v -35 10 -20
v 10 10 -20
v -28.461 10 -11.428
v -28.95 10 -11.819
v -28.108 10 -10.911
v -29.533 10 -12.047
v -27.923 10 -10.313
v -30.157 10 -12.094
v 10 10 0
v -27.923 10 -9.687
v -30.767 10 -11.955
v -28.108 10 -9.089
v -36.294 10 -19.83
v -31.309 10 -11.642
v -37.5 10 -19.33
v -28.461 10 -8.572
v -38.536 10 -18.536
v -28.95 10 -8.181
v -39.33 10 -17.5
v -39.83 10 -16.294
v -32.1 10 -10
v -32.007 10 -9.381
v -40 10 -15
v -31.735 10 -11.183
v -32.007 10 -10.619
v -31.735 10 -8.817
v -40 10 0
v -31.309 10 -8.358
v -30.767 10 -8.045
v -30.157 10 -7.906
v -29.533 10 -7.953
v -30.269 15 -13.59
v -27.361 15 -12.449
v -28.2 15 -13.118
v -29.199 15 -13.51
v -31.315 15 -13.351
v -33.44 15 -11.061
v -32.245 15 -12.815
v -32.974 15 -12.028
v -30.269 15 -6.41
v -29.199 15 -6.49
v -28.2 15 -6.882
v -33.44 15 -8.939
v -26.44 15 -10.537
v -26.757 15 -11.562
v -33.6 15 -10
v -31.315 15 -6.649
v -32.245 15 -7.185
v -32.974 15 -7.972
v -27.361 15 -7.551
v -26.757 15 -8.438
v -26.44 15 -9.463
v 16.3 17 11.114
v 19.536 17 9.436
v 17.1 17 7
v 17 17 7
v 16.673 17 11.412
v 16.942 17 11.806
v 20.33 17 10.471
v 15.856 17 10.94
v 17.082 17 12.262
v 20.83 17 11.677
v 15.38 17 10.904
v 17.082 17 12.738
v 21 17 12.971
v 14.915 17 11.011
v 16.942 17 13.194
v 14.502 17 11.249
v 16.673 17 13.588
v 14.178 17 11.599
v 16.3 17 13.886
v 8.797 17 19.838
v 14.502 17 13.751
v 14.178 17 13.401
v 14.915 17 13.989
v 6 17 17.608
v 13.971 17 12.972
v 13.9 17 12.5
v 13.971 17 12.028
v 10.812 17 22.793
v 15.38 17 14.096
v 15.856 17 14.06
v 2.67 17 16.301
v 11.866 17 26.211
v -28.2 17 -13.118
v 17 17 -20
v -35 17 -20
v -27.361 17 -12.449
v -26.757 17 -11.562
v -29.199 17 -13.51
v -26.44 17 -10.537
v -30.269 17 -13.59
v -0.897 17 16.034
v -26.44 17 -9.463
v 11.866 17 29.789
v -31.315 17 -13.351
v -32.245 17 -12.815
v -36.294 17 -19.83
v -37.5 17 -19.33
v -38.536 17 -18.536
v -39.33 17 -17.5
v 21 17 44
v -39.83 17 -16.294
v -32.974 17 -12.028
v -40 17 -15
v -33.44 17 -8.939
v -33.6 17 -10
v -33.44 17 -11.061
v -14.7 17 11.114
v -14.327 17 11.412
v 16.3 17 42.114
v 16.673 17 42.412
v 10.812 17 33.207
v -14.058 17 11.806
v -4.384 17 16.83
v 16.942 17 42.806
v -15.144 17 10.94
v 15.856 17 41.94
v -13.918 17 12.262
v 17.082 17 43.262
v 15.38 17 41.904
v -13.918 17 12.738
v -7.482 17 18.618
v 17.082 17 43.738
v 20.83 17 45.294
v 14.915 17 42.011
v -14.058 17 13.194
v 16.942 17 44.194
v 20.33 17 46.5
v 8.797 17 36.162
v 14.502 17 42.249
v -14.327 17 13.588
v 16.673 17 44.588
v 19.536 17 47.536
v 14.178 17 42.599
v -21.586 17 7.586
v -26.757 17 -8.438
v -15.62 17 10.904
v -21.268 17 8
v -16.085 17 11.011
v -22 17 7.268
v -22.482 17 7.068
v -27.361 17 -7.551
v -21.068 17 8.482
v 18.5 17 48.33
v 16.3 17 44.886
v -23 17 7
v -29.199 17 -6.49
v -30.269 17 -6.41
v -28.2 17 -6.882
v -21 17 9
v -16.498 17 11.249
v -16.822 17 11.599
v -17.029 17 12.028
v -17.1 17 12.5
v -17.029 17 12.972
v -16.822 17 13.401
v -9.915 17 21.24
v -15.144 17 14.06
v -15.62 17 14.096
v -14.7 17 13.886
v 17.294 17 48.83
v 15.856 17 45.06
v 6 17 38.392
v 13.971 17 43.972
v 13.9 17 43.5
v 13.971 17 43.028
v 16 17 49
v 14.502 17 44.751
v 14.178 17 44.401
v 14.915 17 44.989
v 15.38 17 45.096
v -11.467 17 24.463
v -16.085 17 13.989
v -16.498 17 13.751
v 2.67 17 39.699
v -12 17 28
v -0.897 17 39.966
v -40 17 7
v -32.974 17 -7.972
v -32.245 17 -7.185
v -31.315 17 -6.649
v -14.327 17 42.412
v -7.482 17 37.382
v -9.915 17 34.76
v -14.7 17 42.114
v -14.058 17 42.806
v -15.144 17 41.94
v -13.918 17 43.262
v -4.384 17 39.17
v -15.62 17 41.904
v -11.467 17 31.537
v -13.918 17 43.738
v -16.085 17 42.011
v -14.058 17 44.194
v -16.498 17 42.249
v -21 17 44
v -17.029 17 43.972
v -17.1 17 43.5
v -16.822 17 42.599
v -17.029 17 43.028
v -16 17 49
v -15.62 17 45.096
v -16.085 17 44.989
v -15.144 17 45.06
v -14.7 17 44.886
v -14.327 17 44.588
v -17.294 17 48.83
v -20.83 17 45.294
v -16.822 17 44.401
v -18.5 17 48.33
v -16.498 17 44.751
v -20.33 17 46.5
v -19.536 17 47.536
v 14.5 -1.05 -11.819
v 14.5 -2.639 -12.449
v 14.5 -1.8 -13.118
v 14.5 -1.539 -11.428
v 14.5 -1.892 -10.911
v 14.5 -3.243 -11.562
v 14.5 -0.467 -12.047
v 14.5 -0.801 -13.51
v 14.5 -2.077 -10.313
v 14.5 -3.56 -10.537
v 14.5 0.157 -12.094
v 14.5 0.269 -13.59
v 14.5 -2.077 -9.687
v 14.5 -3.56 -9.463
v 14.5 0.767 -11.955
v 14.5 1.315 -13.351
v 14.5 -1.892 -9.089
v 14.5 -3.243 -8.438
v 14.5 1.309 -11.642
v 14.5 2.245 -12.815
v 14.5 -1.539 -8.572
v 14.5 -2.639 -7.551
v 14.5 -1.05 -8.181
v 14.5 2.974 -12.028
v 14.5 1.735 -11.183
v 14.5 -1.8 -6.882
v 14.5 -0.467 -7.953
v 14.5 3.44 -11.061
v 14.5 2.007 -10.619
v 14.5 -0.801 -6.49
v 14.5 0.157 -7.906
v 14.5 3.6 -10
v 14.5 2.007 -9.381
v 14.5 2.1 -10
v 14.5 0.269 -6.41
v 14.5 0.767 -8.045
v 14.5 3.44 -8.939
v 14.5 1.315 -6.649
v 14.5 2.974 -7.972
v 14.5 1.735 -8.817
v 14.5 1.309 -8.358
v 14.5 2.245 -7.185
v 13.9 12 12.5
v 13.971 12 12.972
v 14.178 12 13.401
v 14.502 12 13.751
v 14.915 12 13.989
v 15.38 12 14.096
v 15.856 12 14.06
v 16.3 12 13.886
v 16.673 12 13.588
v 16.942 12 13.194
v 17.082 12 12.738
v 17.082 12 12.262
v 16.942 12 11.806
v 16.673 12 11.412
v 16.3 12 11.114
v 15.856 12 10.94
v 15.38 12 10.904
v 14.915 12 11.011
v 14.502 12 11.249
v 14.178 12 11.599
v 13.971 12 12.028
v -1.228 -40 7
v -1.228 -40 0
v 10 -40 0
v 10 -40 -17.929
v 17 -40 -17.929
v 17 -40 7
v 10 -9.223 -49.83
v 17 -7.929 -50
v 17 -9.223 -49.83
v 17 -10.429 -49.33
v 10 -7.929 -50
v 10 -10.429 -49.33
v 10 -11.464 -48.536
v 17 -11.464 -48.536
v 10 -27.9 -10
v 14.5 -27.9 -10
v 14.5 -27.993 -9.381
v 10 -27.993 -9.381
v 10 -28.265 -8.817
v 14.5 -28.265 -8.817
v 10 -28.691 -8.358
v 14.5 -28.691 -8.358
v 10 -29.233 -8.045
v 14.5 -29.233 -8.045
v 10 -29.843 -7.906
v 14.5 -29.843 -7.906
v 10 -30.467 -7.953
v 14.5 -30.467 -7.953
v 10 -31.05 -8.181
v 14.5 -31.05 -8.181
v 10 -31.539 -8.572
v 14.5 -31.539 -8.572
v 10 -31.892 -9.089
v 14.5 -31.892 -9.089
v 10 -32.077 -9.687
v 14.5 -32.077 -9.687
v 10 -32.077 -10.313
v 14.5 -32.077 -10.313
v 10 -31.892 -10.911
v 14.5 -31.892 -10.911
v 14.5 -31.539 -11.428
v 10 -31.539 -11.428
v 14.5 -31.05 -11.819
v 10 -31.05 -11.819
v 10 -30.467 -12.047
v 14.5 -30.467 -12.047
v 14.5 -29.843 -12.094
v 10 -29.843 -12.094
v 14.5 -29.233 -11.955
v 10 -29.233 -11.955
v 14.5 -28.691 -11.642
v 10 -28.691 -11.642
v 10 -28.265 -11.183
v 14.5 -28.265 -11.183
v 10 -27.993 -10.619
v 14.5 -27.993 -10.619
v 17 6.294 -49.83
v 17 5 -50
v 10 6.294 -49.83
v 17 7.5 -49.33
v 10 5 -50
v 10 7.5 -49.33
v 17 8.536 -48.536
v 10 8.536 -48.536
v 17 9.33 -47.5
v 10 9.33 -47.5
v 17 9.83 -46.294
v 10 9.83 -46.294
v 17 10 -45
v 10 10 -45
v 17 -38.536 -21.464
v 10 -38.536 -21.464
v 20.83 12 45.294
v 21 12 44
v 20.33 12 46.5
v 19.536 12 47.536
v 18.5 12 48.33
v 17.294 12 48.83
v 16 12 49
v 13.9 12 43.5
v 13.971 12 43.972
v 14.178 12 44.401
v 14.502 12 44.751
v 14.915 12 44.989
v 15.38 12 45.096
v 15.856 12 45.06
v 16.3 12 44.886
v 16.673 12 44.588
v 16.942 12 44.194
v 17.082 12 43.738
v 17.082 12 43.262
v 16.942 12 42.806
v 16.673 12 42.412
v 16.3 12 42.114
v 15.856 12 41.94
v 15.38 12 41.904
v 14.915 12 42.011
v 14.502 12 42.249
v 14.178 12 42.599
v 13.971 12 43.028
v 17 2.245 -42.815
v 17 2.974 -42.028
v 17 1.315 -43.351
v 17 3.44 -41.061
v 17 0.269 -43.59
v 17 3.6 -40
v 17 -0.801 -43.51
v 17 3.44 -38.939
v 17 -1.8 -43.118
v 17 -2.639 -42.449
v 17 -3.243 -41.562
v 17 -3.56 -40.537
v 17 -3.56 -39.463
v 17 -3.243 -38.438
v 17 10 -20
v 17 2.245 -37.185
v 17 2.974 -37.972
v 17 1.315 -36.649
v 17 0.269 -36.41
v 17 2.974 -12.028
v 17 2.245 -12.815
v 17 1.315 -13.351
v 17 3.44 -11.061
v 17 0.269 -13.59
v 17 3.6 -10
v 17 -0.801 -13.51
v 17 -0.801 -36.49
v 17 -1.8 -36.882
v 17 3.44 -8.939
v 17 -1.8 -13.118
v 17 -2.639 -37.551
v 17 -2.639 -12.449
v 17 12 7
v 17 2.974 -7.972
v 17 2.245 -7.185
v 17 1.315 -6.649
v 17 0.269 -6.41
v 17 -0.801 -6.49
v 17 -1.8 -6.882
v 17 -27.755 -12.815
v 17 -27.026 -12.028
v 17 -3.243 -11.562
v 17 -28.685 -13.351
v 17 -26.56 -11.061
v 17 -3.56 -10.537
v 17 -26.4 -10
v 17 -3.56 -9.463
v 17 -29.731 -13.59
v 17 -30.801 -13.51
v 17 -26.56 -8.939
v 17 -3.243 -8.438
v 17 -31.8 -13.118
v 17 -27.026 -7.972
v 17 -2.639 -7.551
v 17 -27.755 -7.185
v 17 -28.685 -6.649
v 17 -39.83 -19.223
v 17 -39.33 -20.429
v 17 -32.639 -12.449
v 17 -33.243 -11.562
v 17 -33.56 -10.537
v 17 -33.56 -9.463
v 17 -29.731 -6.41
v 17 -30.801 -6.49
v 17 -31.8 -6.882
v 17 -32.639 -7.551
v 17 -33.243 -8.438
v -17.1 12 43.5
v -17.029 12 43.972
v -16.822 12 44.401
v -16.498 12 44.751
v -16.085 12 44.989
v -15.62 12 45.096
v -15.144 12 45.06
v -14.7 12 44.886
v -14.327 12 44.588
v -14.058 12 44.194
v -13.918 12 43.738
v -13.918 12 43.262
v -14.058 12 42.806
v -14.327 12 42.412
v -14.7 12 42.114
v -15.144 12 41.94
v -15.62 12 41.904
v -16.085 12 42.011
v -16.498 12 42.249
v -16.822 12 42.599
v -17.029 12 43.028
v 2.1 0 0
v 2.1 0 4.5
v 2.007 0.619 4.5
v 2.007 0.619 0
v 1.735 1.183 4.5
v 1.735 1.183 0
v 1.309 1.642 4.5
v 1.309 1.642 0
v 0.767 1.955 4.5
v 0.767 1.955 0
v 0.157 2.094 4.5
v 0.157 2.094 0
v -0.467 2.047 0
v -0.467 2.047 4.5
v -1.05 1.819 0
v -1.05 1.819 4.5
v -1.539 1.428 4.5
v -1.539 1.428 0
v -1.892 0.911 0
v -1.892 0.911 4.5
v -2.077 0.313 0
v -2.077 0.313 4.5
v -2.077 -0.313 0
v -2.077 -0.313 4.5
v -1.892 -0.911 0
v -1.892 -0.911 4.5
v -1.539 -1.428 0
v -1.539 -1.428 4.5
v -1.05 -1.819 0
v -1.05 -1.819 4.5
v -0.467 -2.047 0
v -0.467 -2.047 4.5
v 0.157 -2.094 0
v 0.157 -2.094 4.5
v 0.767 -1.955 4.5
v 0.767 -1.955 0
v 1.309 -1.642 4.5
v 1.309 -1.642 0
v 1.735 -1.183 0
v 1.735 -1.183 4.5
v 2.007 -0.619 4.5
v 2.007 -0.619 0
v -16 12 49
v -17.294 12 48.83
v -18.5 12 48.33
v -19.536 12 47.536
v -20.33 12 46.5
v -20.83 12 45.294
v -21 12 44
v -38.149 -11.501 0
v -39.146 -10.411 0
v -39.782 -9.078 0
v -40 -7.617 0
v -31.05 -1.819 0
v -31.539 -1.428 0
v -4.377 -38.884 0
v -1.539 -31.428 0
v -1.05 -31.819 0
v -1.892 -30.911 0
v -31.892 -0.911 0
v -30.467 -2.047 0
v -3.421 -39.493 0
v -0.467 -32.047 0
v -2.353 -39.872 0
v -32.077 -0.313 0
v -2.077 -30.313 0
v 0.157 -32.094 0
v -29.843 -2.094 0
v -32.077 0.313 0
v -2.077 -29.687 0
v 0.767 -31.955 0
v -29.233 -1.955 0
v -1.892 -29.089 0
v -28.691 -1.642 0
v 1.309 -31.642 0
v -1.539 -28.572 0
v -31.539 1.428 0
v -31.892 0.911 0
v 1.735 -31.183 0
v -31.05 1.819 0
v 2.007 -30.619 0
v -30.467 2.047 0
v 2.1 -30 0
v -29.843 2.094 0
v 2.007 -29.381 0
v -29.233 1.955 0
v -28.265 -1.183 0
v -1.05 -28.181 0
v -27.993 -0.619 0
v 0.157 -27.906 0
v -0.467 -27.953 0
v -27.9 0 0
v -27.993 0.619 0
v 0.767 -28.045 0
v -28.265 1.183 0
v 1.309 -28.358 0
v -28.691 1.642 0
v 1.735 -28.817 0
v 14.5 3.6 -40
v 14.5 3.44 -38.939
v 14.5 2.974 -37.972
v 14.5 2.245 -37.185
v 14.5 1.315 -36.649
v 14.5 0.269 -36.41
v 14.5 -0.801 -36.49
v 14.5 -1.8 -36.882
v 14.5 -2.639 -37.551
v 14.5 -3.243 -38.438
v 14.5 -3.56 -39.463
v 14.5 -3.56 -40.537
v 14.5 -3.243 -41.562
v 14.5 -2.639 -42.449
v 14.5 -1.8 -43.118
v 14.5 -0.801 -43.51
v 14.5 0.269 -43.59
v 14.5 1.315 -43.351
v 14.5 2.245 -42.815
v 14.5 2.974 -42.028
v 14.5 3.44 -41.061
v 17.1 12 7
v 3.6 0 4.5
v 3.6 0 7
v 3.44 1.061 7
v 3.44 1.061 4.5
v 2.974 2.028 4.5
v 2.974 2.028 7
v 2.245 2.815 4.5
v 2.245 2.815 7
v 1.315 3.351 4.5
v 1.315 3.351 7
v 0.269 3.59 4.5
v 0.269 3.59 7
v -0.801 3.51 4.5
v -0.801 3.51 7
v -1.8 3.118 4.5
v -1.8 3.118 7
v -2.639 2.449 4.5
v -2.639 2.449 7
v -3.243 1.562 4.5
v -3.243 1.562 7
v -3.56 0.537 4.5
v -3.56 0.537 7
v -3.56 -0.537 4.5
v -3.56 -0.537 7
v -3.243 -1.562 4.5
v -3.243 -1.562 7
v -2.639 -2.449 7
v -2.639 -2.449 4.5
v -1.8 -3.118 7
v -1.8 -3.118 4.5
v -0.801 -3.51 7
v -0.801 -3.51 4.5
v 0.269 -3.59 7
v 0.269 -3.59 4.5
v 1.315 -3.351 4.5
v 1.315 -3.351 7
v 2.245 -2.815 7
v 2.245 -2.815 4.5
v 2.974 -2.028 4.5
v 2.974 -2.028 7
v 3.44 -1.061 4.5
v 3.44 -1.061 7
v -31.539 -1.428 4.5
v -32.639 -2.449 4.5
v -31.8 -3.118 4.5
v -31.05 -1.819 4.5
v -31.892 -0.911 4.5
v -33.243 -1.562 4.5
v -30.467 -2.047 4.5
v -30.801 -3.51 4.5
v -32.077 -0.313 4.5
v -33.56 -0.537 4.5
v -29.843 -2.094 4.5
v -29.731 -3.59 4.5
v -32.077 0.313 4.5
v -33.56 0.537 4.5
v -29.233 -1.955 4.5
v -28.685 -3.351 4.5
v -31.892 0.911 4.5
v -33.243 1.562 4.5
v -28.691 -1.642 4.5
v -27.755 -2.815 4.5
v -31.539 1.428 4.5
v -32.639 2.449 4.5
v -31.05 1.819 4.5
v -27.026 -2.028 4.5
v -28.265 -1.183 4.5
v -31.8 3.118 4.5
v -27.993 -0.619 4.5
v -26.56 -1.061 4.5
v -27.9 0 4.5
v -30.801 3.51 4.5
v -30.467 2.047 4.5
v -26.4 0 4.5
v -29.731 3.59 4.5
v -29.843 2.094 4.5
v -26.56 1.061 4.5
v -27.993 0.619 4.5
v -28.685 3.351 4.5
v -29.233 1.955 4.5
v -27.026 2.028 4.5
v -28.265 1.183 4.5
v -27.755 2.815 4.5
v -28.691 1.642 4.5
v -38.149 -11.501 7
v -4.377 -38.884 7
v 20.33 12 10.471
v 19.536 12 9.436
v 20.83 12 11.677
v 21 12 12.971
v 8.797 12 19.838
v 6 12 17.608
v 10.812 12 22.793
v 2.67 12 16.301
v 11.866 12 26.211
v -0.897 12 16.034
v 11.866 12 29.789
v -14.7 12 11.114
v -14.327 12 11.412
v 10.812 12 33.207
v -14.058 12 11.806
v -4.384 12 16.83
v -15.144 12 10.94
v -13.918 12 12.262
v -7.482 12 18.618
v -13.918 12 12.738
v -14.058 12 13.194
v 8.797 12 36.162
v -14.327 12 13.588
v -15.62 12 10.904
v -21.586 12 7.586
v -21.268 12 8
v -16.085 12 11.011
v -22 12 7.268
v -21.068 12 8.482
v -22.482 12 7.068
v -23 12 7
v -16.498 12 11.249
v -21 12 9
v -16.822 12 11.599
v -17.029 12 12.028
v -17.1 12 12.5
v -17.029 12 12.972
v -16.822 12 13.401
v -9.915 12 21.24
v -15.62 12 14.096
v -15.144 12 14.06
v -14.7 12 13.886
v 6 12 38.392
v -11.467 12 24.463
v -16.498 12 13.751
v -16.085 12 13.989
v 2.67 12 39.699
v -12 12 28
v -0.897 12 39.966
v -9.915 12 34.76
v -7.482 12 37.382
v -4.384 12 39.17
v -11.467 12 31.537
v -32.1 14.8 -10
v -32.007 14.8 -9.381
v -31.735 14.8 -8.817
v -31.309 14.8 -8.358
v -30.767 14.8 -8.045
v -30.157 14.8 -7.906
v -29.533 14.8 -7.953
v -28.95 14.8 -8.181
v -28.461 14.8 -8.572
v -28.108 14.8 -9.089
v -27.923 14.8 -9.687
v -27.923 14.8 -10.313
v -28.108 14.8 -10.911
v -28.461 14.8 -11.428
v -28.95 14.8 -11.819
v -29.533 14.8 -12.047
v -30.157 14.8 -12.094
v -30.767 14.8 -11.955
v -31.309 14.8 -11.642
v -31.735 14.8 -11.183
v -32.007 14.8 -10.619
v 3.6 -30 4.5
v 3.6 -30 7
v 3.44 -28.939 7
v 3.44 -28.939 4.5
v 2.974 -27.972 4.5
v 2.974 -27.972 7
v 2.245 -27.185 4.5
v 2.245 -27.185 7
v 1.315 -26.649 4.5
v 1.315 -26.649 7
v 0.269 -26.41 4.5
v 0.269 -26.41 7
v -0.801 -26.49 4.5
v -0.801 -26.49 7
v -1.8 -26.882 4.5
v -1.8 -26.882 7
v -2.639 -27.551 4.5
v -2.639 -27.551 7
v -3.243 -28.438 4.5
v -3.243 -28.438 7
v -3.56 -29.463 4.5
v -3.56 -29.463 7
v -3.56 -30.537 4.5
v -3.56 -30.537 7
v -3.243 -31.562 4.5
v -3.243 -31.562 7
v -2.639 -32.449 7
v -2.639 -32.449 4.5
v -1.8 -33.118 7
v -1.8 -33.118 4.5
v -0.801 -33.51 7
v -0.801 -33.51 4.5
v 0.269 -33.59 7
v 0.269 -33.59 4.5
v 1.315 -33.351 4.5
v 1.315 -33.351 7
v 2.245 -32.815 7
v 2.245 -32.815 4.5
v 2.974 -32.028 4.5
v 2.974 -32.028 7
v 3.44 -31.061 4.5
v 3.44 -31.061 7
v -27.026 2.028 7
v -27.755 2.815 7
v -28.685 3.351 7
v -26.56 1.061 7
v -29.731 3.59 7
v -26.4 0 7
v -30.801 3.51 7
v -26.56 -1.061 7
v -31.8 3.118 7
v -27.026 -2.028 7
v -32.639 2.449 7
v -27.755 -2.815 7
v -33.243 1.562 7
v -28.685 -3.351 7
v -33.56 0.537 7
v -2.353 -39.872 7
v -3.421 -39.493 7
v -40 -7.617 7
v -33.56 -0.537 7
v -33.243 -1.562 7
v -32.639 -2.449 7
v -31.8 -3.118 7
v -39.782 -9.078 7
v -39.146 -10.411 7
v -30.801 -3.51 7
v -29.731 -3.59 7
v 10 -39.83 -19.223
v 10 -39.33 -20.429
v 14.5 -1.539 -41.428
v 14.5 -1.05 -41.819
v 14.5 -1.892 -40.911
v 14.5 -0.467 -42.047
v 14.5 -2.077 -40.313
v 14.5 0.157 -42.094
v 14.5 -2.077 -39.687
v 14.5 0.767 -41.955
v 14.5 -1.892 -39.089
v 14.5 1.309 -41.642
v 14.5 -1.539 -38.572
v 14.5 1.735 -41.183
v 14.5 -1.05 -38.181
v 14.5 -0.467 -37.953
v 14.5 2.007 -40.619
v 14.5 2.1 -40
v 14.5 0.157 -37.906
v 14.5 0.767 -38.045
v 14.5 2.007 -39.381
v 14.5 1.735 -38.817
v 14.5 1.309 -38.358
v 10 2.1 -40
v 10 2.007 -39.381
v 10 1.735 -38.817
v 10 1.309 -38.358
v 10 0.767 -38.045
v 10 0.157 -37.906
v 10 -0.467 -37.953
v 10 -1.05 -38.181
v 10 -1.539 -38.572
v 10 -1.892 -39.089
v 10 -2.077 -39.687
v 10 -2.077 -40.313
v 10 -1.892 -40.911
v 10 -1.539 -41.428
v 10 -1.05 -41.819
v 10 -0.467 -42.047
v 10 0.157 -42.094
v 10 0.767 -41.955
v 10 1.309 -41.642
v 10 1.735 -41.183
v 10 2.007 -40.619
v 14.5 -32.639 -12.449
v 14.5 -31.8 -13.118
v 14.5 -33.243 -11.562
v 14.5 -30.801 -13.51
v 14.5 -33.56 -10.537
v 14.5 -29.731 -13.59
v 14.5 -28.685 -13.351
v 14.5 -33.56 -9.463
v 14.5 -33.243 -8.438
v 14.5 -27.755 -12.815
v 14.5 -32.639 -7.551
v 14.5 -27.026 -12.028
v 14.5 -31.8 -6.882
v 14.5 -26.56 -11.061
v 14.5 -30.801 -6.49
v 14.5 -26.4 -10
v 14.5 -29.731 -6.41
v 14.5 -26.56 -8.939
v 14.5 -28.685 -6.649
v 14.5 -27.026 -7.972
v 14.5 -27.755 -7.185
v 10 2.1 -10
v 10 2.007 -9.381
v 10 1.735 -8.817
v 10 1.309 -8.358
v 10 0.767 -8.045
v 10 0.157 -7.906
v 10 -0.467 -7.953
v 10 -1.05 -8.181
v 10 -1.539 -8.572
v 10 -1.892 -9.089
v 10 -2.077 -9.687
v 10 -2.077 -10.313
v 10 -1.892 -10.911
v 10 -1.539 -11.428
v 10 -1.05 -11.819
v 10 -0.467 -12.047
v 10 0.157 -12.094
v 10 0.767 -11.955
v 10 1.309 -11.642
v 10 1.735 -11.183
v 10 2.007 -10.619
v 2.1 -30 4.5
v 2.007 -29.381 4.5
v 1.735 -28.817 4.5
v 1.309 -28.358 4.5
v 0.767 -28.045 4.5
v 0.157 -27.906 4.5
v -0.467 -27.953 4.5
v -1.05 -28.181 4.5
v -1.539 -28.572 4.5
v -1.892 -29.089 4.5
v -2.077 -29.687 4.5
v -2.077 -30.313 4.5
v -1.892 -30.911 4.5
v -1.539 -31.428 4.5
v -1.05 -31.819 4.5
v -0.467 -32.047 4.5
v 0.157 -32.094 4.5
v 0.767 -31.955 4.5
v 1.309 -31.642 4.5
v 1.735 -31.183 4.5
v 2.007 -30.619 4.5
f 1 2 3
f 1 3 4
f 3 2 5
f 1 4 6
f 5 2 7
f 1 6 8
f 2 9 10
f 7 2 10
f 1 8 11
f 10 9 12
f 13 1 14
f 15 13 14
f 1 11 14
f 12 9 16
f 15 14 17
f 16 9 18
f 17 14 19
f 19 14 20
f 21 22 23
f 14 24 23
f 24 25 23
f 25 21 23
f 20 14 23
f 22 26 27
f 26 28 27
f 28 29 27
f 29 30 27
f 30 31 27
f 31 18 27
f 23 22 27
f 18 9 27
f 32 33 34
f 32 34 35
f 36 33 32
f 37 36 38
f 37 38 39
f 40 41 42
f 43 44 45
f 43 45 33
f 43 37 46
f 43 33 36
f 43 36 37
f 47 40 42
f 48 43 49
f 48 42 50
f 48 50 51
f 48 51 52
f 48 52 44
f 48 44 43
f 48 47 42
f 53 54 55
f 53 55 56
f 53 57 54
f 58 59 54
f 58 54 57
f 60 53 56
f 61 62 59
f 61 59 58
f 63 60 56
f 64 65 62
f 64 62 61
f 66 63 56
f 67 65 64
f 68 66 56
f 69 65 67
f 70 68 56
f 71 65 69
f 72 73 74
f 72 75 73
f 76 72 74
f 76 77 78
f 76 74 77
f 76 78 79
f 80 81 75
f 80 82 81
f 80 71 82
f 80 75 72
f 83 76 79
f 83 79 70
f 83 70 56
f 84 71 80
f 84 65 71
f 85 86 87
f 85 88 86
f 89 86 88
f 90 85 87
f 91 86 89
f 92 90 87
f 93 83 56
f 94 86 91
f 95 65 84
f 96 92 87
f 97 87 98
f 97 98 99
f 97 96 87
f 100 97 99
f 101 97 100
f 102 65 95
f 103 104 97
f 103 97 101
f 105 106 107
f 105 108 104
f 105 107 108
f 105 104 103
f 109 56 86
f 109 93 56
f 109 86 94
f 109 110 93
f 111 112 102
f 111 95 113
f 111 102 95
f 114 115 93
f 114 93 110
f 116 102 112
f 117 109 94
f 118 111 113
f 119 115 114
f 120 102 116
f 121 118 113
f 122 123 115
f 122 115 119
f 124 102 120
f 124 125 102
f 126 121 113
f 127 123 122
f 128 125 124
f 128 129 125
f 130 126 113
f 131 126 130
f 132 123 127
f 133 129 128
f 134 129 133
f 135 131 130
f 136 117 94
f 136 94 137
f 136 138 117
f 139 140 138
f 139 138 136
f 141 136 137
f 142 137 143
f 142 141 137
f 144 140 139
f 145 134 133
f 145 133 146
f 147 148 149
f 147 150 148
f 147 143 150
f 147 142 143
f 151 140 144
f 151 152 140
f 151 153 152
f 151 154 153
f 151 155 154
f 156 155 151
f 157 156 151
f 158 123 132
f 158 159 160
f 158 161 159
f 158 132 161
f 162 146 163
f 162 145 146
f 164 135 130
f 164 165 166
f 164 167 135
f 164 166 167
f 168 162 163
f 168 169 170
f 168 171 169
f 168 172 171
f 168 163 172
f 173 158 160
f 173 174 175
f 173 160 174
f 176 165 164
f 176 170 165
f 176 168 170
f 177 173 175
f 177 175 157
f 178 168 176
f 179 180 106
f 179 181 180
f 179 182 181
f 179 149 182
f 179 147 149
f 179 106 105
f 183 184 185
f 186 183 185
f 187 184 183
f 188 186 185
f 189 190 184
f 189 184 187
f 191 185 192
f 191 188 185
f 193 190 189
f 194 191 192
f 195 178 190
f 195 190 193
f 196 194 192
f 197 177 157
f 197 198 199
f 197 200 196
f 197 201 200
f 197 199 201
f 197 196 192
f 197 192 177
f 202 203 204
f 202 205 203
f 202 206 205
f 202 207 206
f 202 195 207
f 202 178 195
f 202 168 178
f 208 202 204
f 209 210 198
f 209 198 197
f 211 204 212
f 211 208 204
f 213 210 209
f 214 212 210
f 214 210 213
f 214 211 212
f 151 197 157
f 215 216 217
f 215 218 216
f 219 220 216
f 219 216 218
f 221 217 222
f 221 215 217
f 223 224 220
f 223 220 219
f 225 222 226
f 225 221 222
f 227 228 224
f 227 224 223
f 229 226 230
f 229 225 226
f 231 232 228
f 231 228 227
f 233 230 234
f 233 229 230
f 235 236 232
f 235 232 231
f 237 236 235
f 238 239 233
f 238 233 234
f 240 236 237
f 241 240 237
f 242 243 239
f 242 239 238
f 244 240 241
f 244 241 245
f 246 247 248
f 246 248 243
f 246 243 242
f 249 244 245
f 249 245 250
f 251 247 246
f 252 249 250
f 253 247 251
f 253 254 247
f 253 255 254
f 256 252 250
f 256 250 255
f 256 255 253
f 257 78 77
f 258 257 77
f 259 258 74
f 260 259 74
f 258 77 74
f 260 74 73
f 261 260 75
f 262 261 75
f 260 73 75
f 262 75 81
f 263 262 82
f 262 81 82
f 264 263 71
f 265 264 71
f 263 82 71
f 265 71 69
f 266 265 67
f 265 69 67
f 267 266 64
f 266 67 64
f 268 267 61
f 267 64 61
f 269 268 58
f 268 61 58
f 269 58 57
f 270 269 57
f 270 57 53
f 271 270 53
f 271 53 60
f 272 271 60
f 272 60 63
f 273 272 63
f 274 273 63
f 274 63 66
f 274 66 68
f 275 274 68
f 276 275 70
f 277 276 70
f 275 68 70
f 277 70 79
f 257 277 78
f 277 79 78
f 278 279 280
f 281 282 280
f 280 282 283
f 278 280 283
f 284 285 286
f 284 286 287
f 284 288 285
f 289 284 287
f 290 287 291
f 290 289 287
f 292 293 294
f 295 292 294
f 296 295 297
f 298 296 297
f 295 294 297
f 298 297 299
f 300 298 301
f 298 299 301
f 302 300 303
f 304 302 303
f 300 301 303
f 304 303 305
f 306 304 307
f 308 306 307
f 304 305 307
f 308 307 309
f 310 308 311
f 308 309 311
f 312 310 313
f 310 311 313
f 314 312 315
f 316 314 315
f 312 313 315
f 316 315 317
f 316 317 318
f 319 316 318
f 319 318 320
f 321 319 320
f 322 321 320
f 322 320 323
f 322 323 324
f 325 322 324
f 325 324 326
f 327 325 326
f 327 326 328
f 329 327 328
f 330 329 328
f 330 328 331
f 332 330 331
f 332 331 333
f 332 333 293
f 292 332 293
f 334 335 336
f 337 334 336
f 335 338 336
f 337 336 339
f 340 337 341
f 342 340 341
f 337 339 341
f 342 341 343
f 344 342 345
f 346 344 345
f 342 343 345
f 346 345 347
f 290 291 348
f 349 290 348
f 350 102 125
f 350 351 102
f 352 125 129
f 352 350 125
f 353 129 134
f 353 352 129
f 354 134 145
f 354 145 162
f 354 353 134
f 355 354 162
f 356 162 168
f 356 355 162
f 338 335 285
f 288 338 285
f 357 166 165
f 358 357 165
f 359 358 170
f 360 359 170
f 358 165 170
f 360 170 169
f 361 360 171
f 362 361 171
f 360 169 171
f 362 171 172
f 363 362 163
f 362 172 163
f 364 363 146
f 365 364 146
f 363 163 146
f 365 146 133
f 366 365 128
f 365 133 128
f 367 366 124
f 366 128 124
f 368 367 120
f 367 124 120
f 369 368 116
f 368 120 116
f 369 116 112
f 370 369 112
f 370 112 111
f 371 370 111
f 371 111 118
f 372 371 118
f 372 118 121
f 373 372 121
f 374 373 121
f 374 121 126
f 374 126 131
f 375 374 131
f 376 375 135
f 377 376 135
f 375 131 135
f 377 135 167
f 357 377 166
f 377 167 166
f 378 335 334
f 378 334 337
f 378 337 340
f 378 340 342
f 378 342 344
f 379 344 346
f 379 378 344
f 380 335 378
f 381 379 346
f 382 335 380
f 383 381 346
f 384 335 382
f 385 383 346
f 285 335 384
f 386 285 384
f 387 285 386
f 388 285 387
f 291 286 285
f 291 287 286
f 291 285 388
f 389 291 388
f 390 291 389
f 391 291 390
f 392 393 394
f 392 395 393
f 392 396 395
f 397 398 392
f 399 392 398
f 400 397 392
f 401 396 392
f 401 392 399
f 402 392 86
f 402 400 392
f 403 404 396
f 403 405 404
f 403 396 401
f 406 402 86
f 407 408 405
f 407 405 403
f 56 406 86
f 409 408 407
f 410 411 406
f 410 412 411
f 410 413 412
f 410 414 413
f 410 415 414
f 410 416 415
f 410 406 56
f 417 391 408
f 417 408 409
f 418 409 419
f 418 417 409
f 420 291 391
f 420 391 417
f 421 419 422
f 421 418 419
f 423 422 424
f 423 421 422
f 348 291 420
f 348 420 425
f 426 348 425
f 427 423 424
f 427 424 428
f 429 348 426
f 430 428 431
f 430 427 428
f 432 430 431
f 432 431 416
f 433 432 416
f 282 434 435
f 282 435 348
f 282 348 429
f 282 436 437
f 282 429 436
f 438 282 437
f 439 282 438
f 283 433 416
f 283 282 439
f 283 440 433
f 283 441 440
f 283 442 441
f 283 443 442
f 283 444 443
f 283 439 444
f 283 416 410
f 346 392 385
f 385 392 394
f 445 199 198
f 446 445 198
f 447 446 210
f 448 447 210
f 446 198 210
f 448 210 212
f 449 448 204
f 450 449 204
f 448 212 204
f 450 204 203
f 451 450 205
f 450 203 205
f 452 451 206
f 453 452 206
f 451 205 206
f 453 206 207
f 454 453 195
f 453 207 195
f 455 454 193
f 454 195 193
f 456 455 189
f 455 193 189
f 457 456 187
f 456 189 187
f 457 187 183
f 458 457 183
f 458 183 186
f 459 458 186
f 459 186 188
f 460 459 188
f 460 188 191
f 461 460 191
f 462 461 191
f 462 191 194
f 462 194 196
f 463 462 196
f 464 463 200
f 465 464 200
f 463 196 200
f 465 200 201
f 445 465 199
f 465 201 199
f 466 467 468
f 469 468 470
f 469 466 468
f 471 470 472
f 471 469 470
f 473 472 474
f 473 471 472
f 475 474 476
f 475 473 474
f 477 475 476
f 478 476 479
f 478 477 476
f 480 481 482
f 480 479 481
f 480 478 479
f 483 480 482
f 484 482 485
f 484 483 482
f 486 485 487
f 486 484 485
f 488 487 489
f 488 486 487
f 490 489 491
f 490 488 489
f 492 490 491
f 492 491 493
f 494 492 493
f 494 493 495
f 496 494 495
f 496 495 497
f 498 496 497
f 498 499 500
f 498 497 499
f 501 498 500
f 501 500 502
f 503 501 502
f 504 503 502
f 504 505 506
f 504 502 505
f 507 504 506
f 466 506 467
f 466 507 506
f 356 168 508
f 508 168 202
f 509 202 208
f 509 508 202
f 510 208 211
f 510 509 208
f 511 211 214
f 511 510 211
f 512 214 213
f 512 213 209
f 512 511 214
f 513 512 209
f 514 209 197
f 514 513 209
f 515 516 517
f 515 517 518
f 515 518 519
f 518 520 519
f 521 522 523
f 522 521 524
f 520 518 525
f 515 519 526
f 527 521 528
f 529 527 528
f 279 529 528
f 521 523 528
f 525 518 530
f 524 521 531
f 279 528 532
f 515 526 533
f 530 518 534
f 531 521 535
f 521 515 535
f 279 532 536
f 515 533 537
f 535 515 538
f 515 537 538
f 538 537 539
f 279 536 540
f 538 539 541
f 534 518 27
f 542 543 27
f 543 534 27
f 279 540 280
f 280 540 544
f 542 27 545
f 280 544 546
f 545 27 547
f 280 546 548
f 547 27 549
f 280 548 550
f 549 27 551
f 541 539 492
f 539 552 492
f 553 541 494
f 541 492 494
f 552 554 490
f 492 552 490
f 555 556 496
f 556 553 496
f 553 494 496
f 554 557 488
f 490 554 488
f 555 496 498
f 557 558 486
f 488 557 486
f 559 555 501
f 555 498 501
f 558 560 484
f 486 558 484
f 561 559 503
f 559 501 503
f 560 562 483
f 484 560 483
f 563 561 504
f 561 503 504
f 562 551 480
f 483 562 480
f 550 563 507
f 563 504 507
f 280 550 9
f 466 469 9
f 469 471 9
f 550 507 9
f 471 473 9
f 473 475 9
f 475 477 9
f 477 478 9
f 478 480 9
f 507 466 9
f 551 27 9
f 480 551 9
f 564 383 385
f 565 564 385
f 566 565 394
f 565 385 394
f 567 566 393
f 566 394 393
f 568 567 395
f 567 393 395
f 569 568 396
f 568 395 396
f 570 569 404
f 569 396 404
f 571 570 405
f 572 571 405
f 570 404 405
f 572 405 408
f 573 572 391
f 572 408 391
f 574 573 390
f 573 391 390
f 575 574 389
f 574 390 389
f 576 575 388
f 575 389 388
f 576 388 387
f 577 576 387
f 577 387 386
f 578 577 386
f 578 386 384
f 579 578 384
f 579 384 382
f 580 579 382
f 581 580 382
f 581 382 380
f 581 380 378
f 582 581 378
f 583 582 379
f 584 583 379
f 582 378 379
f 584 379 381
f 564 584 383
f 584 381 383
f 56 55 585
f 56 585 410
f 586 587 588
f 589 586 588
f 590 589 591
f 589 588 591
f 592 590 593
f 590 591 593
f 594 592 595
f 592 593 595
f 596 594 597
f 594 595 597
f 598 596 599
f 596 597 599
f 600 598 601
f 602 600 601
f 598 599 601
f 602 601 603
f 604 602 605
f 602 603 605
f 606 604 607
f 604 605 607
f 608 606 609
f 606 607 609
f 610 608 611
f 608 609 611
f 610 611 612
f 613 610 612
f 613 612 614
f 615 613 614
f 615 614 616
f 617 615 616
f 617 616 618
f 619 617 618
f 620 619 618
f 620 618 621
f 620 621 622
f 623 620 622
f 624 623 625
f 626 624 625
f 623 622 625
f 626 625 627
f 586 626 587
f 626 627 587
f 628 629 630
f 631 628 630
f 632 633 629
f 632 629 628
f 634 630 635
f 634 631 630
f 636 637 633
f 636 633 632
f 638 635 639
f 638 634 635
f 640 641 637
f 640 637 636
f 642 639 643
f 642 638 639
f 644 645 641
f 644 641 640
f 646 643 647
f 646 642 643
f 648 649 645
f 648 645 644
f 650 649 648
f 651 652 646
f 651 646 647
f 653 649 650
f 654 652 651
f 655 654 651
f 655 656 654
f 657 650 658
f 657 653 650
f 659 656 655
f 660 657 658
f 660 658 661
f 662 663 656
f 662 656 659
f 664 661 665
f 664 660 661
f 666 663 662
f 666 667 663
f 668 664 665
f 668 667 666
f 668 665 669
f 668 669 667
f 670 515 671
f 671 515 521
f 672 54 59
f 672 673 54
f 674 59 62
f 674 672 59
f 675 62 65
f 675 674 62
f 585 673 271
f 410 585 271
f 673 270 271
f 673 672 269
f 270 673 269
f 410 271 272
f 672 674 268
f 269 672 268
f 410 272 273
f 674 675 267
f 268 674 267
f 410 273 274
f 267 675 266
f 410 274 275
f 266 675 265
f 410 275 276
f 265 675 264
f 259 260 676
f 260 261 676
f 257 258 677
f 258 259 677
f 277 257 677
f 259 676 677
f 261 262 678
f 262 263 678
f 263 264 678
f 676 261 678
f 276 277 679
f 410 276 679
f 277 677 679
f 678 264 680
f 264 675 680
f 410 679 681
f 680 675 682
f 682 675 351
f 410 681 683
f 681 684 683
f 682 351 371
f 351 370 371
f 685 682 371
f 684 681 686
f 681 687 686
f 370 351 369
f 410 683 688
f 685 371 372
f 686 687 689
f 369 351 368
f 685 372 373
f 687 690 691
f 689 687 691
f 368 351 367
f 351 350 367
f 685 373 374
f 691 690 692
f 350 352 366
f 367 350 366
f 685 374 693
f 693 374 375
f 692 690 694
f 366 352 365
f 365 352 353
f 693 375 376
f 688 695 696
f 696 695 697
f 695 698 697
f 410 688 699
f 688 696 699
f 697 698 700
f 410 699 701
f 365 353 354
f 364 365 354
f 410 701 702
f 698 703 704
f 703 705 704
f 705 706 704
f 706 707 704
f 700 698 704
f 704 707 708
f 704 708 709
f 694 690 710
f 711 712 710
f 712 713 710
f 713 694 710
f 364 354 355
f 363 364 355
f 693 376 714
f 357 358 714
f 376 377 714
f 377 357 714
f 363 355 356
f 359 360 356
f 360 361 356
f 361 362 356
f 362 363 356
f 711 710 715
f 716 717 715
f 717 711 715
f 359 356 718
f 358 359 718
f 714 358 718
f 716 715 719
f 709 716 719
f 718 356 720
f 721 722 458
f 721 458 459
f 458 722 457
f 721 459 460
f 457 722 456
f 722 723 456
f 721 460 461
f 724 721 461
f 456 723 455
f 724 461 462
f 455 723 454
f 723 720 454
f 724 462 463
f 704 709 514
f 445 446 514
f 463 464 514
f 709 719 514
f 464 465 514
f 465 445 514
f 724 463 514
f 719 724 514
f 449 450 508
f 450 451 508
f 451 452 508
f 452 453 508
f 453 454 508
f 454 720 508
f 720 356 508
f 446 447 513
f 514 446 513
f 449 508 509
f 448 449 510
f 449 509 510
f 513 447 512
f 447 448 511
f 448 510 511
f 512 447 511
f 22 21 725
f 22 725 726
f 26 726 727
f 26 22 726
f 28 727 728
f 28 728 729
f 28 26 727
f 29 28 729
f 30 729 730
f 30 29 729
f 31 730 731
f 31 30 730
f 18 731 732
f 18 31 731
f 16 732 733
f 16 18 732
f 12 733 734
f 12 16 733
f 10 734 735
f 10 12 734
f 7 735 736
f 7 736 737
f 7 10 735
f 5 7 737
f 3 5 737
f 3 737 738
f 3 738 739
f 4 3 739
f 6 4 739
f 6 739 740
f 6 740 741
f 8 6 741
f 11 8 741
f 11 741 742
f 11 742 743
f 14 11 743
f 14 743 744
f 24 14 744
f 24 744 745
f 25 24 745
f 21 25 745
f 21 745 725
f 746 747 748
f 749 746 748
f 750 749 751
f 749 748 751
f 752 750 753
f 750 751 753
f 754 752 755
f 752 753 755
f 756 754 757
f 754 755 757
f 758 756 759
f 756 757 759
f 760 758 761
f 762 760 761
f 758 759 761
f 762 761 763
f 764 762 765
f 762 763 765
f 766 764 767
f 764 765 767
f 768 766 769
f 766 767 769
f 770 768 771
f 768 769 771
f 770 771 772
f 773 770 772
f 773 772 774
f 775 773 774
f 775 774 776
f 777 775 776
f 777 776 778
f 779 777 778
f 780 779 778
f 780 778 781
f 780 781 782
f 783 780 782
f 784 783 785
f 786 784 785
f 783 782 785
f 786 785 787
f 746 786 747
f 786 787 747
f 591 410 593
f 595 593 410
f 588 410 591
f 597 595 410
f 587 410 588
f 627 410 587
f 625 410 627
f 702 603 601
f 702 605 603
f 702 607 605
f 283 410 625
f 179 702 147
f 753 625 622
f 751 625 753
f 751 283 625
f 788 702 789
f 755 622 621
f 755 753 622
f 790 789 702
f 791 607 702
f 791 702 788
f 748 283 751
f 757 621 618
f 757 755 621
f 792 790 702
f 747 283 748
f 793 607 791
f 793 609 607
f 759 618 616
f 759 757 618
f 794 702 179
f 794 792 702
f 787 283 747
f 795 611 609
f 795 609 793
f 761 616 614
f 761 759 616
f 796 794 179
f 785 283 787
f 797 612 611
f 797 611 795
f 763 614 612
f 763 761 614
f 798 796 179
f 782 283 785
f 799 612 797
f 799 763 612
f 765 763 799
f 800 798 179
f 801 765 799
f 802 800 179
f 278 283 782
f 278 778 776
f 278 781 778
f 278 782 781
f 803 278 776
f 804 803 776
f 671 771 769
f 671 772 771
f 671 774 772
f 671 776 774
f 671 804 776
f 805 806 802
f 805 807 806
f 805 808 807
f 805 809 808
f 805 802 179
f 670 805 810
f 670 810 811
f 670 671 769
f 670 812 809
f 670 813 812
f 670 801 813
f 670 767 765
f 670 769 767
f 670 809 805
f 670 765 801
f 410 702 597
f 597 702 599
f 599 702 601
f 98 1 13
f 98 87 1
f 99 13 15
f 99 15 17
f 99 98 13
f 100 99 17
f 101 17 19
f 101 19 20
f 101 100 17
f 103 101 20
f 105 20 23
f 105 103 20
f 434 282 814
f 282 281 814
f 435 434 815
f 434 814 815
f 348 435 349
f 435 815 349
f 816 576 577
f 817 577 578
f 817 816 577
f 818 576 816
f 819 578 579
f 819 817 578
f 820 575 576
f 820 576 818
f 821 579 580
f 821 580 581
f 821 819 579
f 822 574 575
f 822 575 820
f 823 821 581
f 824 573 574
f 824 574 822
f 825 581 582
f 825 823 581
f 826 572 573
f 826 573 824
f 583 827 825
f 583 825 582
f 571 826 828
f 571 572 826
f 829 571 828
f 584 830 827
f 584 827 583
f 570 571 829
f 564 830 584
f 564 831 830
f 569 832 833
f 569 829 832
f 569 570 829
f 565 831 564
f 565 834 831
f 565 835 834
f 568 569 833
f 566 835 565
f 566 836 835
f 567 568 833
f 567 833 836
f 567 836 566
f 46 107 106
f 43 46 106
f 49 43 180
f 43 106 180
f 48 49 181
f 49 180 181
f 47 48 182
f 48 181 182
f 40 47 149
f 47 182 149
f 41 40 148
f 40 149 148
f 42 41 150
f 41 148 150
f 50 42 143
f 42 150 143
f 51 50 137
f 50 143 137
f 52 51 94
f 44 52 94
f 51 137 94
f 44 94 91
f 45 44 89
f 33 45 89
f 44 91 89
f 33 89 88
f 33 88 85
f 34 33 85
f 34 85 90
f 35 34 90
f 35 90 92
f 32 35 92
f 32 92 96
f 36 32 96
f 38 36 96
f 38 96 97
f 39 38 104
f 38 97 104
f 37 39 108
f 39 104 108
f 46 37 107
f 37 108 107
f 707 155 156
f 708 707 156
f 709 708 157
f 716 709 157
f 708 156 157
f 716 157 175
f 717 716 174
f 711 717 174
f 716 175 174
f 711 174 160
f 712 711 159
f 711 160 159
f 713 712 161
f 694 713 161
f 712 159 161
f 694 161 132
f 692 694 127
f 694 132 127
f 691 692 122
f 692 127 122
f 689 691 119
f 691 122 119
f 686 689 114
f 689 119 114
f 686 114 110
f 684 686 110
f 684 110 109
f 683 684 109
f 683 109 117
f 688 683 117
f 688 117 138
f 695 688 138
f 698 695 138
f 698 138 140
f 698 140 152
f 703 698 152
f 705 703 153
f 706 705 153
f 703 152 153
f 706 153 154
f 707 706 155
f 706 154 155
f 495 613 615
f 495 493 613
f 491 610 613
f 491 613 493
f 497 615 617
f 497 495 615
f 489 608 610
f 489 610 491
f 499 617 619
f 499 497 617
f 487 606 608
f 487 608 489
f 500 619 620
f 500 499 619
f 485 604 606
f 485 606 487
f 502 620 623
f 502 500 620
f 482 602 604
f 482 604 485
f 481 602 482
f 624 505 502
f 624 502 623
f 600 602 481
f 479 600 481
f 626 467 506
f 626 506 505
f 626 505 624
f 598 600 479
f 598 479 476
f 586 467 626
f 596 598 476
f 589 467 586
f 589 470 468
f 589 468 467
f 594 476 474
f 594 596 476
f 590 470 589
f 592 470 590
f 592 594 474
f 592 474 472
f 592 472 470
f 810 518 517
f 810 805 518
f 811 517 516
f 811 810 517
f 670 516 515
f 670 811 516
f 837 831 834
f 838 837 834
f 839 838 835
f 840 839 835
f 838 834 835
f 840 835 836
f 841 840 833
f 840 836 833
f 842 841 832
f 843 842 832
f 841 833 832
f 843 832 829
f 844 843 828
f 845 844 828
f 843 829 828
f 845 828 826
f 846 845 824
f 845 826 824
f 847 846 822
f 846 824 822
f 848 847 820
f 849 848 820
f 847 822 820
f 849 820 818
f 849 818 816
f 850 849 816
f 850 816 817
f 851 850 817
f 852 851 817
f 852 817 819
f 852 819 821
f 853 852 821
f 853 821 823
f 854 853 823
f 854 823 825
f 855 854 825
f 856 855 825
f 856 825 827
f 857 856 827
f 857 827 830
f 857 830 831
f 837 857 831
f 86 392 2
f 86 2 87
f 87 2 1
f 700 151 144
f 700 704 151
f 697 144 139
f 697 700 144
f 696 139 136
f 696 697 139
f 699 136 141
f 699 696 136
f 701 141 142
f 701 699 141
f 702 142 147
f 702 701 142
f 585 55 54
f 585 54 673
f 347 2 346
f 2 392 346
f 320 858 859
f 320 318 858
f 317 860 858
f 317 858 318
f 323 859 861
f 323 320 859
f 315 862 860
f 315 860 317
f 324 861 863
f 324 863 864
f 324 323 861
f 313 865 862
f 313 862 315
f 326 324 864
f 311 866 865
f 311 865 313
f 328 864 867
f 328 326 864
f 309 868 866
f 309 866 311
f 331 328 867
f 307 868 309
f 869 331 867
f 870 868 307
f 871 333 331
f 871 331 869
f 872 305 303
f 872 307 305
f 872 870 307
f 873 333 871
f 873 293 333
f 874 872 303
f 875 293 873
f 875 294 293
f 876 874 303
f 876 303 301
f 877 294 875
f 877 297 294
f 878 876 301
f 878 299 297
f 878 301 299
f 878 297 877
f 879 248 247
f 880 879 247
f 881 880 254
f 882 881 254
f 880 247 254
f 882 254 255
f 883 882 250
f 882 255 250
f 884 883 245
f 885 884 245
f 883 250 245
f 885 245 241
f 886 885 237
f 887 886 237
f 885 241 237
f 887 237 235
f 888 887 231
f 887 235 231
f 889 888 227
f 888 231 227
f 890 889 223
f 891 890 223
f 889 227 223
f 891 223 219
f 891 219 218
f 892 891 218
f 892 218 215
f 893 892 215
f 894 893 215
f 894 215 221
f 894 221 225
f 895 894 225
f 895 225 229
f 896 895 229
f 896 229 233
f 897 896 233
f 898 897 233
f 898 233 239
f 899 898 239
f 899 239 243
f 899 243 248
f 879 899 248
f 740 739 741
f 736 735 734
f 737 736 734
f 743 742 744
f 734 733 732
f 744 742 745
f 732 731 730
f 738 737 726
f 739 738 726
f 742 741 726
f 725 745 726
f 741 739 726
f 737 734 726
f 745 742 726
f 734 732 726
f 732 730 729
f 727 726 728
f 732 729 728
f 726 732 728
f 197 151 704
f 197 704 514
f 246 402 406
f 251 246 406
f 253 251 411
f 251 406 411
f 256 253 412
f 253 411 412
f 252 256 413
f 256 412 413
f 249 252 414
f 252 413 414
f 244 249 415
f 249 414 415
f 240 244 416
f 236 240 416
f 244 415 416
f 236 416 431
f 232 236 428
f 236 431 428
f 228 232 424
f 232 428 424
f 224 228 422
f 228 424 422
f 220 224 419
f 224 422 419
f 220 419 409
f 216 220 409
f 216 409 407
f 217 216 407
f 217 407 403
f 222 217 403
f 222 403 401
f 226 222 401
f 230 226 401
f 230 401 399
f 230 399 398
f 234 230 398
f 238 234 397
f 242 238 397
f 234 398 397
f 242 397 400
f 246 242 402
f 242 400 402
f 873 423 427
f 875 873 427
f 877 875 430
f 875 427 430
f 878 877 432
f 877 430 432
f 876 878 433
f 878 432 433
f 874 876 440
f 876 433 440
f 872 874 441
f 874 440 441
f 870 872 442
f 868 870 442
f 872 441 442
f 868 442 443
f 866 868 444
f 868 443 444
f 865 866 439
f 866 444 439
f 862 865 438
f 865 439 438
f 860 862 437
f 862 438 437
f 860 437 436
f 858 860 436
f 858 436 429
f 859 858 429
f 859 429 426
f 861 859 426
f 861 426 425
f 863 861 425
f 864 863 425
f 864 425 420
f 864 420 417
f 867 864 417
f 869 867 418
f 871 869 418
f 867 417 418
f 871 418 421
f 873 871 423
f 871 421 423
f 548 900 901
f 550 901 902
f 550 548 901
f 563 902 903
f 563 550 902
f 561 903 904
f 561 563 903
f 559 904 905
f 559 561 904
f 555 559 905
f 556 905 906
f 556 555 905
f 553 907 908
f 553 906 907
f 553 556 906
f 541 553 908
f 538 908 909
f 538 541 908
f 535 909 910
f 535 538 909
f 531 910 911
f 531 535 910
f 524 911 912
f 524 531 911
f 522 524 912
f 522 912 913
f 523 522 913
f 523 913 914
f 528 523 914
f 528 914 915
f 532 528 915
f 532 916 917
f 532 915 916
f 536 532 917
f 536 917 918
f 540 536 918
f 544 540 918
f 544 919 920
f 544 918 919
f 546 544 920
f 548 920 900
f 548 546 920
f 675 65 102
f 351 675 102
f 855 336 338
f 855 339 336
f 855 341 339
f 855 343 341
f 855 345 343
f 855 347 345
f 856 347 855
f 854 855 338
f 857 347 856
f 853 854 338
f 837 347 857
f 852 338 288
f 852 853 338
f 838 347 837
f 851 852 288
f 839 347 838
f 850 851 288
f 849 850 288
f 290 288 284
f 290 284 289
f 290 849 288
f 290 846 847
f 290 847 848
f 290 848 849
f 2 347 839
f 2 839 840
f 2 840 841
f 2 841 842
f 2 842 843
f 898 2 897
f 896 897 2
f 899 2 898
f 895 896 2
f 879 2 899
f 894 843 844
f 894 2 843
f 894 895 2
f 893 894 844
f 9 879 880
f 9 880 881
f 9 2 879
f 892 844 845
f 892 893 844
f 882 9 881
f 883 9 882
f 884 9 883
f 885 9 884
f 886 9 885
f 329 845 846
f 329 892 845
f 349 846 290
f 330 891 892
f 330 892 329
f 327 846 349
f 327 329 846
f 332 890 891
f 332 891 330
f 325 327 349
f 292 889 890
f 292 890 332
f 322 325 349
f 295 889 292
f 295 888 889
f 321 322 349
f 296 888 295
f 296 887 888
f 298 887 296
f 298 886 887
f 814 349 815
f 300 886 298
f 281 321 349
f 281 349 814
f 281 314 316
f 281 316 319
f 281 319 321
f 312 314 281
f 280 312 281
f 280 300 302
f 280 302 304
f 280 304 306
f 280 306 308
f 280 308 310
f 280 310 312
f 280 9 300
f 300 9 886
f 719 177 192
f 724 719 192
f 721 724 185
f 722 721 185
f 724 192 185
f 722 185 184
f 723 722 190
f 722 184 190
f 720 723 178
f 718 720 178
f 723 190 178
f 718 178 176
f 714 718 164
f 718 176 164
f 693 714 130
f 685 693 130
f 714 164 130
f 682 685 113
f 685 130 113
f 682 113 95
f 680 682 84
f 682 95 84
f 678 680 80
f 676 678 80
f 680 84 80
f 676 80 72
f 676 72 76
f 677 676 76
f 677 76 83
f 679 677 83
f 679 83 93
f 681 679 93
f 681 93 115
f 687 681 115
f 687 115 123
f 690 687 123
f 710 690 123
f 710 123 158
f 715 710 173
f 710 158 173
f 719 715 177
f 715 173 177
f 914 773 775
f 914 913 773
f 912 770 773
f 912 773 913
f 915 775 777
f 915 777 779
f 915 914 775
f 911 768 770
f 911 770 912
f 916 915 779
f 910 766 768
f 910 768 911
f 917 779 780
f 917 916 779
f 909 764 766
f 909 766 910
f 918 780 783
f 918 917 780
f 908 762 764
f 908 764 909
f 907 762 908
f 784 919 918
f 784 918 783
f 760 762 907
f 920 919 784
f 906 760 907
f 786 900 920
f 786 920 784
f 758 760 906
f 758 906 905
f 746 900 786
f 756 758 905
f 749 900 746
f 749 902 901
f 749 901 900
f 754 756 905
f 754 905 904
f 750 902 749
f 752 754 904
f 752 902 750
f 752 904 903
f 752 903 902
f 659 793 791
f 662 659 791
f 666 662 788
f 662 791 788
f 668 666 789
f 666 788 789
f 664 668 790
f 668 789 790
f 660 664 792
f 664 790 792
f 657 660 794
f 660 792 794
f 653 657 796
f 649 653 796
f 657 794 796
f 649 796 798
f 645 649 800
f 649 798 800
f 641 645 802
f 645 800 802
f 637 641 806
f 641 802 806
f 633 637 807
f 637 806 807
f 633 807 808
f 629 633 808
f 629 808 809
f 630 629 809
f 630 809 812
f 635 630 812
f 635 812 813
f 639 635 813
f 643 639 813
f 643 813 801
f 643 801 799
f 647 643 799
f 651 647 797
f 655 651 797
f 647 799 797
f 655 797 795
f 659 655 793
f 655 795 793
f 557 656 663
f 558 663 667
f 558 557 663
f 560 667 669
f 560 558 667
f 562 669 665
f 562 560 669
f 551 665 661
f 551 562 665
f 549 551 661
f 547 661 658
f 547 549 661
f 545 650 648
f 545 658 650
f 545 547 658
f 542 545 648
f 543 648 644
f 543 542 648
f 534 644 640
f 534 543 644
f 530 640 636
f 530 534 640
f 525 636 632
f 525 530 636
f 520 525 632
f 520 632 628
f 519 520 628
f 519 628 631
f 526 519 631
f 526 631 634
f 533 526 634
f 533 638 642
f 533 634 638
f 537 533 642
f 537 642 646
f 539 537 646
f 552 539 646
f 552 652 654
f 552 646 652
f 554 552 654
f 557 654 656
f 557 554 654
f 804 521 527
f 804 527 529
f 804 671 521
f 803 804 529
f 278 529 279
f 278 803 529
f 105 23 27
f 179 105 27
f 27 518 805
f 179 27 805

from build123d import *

# Parameters (mm, degrees)
SKETCH_R        = 2.1
PAD_DEPTH       = 7
SKETCH001_R     = 2.1
PAD001_DEPTH    = 7
SKETCH002_W     = 57
SKETCH002_H     = 27
SKETCH002_R     = 2.1
PAD002_DEPTH    = 7
SKETCH003_R     = 3.6
POCKET_DEPTH    = 2.5
SKETCH004_R     = 3.6
POCKET001_DEPTH = 2
SKETCH005_R     = 3.6
POCKET002_DEPTH = 2
SKETCH006_W     = 42
SKETCH006_H     = 42
SKETCH006_R     = 1.6
SKETCH006_R_2   = 12
PAD003_DEPTH    = 5
SKETCH007_R     = 3.6
POCKET003_DEPTH = 2.5
SKETCH008_R     = 2.1
PAD004_DEPTH    = 0.2
CHAMFER_SIZE    = 3.9
FILLET_R        = 5
FILLET001_R     = 2
FILLET002_R     = 5
FILLET003_R     = 5
FILLET004_R     = 5


with BuildPart() as part:
    # Sketch → Pad (new body)
    with BuildSketch(Plane.XY):
        Polygon((-40, 10), (-40, -10), (-3, -40), (17, -40), (17, 10), align=None)
        Circle(SKETCH_R, mode=Mode.SUBTRACT)
        with Locations((0, -30)):
            Circle(SKETCH_R, mode=Mode.SUBTRACT)
        with Locations((-30, 0)):
            Circle(SKETCH_R, mode=Mode.SUBTRACT)
    extrude(amount=PAD_DEPTH)

    # Sketch001 → Pad001 (new body)
    with BuildSketch(Plane.YZ.offset(17)):
        Polygon((10, 0), (10, -50), (-10, -50), (-40, -20), (-40, 0), align=None)
        with Locations((0, -10)):
            Circle(SKETCH001_R, mode=Mode.SUBTRACT)
        with Locations((0, -40)):
            Circle(SKETCH001_R, mode=Mode.SUBTRACT)
        with Locations((-30, -10)):
            Circle(SKETCH001_R, mode=Mode.SUBTRACT)
    extrude(amount=-PAD001_DEPTH)

    # Sketch002 → Pad002 (new body)
    with BuildSketch(Plane(origin=(0, 10, 0), x_dir=(-1, 0, 0), z_dir=(0, 1, 0))):
        with Locations((11.5, -6.5)):
            Rectangle(SKETCH002_W, SKETCH002_H)
        with Locations((30, -10)):
            Circle(SKETCH002_R, mode=Mode.SUBTRACT)
    extrude(amount=PAD002_DEPTH)

    # Sketch003 → Pocket (cut)
    with BuildSketch(Plane.XY.offset(7)):
        Circle(SKETCH003_R)
        with Locations((-30, 0)):
            Circle(SKETCH003_R)
        with Locations((0, -30)):
            Circle(SKETCH003_R)
    extrude(amount=-POCKET_DEPTH, mode=Mode.SUBTRACT)

    # Sketch004 → Pocket001 (cut)
    with BuildSketch(Plane(origin=(-40, 0, 0), x_dir=(0, -1, 0), z_dir=(-1, 0, 0))):
        with Locations((-30, -10)):
            Circle(SKETCH004_R)
        with Locations((0, -10)):
            Circle(SKETCH004_R)
        with Locations((0, -40)):
            Circle(SKETCH004_R)
    extrude(amount=-POCKET001_DEPTH, mode=Mode.SUBTRACT)

    # Sketch005 → Pocket002 (cut)
    with BuildSketch(Plane(origin=(0, 17, 0), x_dir=(-1, 0, 0), z_dir=(0, 1, 0))):
        with Locations((30, -10)):
            Circle(SKETCH005_R)
    extrude(amount=-POCKET002_DEPTH, mode=Mode.SUBTRACT)

    # Sketch006 → Pad003 (new body)
    with BuildSketch(Plane(origin=(0, 17, 0), x_dir=(-1, 0, 0), z_dir=(0, 1, 0))):
        with Locations((0, 28)):
            Rectangle(SKETCH006_W, SKETCH006_H)
        with Locations((-15.5, 43.5)):
            Circle(SKETCH006_R, mode=Mode.SUBTRACT)
        with Locations((15.5, 43.5)):
            Circle(SKETCH006_R, mode=Mode.SUBTRACT)
        with Locations((15.5, 12.5)):
            Circle(SKETCH006_R, mode=Mode.SUBTRACT)
        with Locations((-15.5, 12.5)):
            Circle(SKETCH006_R, mode=Mode.SUBTRACT)
        with Locations((0, 28)):
            Circle(SKETCH006_R_2, mode=Mode.SUBTRACT)
    extrude(amount=-PAD003_DEPTH)

    # Sketch007 → Pocket003 (cut)
    with BuildSketch(Plane.YZ.offset(17)):
        with Locations((-30, -10)):
            Circle(SKETCH007_R)
        with Locations((0, -10)):
            Circle(SKETCH007_R)
        with Locations((0, -40)):
            Circle(SKETCH007_R)
    extrude(amount=-POCKET003_DEPTH, mode=Mode.SUBTRACT)

    # Sketch008 → Pad004 (new body)
    with BuildSketch(Plane(origin=(0, 15, 0), x_dir=(-1, 0, 0), z_dir=(0, 1, 0))):
        with Locations((30, -10)):
            Circle(SKETCH008_R)
    extrude(amount=-PAD004_DEPTH)

    # Chamfer
    chamfer_edges = [part.edges().sort_by_distance(p)[0] for p in [
        (21, 14.5, 7),
    ]]
    chamfer(chamfer_edges, length=CHAMFER_SIZE)

    # Fillet
    fillet_edges = [part.edges().sort_by_distance(p)[0] for p in [
        (21, 14.5, 49),
        (-21, 14.5, 49),
    ]]
    fillet(fillet_edges, radius=FILLET_R)

    # Fillet001
    fillet001_edges = [part.edges().sort_by_distance(p)[0] for p in [
        (-21, 14.5, 7),
    ]]
    fillet(fillet001_edges, radius=FILLET001_R)

    # Fillet002
    fillet002_edges = [part.edges().sort_by_distance(p)[0] for p in [
        (13.5, 10, -50),
        (-40, 13.5, -20),
    ]]
    fillet(fillet002_edges, radius=FILLET002_R)

    # Fillet003
    fillet003_edges = [part.edges().sort_by_distance(p)[0] for p in [
        (13.5, -40, -20),
        (-3, -40, 3.5),
        (-40, -10, 3.5),
        (13.5, -10, -50),
    ]]
    fillet(fillet003_edges, radius=FILLET003_R)

    # Fillet004
    fillet004_edges = [part.edges().sort_by_distance(p)[0] for p in [
        (21, 14.5, 10.9),
    ]]
    fillet(fillet004_edges, radius=FILLET004_R)


solid = part.part
